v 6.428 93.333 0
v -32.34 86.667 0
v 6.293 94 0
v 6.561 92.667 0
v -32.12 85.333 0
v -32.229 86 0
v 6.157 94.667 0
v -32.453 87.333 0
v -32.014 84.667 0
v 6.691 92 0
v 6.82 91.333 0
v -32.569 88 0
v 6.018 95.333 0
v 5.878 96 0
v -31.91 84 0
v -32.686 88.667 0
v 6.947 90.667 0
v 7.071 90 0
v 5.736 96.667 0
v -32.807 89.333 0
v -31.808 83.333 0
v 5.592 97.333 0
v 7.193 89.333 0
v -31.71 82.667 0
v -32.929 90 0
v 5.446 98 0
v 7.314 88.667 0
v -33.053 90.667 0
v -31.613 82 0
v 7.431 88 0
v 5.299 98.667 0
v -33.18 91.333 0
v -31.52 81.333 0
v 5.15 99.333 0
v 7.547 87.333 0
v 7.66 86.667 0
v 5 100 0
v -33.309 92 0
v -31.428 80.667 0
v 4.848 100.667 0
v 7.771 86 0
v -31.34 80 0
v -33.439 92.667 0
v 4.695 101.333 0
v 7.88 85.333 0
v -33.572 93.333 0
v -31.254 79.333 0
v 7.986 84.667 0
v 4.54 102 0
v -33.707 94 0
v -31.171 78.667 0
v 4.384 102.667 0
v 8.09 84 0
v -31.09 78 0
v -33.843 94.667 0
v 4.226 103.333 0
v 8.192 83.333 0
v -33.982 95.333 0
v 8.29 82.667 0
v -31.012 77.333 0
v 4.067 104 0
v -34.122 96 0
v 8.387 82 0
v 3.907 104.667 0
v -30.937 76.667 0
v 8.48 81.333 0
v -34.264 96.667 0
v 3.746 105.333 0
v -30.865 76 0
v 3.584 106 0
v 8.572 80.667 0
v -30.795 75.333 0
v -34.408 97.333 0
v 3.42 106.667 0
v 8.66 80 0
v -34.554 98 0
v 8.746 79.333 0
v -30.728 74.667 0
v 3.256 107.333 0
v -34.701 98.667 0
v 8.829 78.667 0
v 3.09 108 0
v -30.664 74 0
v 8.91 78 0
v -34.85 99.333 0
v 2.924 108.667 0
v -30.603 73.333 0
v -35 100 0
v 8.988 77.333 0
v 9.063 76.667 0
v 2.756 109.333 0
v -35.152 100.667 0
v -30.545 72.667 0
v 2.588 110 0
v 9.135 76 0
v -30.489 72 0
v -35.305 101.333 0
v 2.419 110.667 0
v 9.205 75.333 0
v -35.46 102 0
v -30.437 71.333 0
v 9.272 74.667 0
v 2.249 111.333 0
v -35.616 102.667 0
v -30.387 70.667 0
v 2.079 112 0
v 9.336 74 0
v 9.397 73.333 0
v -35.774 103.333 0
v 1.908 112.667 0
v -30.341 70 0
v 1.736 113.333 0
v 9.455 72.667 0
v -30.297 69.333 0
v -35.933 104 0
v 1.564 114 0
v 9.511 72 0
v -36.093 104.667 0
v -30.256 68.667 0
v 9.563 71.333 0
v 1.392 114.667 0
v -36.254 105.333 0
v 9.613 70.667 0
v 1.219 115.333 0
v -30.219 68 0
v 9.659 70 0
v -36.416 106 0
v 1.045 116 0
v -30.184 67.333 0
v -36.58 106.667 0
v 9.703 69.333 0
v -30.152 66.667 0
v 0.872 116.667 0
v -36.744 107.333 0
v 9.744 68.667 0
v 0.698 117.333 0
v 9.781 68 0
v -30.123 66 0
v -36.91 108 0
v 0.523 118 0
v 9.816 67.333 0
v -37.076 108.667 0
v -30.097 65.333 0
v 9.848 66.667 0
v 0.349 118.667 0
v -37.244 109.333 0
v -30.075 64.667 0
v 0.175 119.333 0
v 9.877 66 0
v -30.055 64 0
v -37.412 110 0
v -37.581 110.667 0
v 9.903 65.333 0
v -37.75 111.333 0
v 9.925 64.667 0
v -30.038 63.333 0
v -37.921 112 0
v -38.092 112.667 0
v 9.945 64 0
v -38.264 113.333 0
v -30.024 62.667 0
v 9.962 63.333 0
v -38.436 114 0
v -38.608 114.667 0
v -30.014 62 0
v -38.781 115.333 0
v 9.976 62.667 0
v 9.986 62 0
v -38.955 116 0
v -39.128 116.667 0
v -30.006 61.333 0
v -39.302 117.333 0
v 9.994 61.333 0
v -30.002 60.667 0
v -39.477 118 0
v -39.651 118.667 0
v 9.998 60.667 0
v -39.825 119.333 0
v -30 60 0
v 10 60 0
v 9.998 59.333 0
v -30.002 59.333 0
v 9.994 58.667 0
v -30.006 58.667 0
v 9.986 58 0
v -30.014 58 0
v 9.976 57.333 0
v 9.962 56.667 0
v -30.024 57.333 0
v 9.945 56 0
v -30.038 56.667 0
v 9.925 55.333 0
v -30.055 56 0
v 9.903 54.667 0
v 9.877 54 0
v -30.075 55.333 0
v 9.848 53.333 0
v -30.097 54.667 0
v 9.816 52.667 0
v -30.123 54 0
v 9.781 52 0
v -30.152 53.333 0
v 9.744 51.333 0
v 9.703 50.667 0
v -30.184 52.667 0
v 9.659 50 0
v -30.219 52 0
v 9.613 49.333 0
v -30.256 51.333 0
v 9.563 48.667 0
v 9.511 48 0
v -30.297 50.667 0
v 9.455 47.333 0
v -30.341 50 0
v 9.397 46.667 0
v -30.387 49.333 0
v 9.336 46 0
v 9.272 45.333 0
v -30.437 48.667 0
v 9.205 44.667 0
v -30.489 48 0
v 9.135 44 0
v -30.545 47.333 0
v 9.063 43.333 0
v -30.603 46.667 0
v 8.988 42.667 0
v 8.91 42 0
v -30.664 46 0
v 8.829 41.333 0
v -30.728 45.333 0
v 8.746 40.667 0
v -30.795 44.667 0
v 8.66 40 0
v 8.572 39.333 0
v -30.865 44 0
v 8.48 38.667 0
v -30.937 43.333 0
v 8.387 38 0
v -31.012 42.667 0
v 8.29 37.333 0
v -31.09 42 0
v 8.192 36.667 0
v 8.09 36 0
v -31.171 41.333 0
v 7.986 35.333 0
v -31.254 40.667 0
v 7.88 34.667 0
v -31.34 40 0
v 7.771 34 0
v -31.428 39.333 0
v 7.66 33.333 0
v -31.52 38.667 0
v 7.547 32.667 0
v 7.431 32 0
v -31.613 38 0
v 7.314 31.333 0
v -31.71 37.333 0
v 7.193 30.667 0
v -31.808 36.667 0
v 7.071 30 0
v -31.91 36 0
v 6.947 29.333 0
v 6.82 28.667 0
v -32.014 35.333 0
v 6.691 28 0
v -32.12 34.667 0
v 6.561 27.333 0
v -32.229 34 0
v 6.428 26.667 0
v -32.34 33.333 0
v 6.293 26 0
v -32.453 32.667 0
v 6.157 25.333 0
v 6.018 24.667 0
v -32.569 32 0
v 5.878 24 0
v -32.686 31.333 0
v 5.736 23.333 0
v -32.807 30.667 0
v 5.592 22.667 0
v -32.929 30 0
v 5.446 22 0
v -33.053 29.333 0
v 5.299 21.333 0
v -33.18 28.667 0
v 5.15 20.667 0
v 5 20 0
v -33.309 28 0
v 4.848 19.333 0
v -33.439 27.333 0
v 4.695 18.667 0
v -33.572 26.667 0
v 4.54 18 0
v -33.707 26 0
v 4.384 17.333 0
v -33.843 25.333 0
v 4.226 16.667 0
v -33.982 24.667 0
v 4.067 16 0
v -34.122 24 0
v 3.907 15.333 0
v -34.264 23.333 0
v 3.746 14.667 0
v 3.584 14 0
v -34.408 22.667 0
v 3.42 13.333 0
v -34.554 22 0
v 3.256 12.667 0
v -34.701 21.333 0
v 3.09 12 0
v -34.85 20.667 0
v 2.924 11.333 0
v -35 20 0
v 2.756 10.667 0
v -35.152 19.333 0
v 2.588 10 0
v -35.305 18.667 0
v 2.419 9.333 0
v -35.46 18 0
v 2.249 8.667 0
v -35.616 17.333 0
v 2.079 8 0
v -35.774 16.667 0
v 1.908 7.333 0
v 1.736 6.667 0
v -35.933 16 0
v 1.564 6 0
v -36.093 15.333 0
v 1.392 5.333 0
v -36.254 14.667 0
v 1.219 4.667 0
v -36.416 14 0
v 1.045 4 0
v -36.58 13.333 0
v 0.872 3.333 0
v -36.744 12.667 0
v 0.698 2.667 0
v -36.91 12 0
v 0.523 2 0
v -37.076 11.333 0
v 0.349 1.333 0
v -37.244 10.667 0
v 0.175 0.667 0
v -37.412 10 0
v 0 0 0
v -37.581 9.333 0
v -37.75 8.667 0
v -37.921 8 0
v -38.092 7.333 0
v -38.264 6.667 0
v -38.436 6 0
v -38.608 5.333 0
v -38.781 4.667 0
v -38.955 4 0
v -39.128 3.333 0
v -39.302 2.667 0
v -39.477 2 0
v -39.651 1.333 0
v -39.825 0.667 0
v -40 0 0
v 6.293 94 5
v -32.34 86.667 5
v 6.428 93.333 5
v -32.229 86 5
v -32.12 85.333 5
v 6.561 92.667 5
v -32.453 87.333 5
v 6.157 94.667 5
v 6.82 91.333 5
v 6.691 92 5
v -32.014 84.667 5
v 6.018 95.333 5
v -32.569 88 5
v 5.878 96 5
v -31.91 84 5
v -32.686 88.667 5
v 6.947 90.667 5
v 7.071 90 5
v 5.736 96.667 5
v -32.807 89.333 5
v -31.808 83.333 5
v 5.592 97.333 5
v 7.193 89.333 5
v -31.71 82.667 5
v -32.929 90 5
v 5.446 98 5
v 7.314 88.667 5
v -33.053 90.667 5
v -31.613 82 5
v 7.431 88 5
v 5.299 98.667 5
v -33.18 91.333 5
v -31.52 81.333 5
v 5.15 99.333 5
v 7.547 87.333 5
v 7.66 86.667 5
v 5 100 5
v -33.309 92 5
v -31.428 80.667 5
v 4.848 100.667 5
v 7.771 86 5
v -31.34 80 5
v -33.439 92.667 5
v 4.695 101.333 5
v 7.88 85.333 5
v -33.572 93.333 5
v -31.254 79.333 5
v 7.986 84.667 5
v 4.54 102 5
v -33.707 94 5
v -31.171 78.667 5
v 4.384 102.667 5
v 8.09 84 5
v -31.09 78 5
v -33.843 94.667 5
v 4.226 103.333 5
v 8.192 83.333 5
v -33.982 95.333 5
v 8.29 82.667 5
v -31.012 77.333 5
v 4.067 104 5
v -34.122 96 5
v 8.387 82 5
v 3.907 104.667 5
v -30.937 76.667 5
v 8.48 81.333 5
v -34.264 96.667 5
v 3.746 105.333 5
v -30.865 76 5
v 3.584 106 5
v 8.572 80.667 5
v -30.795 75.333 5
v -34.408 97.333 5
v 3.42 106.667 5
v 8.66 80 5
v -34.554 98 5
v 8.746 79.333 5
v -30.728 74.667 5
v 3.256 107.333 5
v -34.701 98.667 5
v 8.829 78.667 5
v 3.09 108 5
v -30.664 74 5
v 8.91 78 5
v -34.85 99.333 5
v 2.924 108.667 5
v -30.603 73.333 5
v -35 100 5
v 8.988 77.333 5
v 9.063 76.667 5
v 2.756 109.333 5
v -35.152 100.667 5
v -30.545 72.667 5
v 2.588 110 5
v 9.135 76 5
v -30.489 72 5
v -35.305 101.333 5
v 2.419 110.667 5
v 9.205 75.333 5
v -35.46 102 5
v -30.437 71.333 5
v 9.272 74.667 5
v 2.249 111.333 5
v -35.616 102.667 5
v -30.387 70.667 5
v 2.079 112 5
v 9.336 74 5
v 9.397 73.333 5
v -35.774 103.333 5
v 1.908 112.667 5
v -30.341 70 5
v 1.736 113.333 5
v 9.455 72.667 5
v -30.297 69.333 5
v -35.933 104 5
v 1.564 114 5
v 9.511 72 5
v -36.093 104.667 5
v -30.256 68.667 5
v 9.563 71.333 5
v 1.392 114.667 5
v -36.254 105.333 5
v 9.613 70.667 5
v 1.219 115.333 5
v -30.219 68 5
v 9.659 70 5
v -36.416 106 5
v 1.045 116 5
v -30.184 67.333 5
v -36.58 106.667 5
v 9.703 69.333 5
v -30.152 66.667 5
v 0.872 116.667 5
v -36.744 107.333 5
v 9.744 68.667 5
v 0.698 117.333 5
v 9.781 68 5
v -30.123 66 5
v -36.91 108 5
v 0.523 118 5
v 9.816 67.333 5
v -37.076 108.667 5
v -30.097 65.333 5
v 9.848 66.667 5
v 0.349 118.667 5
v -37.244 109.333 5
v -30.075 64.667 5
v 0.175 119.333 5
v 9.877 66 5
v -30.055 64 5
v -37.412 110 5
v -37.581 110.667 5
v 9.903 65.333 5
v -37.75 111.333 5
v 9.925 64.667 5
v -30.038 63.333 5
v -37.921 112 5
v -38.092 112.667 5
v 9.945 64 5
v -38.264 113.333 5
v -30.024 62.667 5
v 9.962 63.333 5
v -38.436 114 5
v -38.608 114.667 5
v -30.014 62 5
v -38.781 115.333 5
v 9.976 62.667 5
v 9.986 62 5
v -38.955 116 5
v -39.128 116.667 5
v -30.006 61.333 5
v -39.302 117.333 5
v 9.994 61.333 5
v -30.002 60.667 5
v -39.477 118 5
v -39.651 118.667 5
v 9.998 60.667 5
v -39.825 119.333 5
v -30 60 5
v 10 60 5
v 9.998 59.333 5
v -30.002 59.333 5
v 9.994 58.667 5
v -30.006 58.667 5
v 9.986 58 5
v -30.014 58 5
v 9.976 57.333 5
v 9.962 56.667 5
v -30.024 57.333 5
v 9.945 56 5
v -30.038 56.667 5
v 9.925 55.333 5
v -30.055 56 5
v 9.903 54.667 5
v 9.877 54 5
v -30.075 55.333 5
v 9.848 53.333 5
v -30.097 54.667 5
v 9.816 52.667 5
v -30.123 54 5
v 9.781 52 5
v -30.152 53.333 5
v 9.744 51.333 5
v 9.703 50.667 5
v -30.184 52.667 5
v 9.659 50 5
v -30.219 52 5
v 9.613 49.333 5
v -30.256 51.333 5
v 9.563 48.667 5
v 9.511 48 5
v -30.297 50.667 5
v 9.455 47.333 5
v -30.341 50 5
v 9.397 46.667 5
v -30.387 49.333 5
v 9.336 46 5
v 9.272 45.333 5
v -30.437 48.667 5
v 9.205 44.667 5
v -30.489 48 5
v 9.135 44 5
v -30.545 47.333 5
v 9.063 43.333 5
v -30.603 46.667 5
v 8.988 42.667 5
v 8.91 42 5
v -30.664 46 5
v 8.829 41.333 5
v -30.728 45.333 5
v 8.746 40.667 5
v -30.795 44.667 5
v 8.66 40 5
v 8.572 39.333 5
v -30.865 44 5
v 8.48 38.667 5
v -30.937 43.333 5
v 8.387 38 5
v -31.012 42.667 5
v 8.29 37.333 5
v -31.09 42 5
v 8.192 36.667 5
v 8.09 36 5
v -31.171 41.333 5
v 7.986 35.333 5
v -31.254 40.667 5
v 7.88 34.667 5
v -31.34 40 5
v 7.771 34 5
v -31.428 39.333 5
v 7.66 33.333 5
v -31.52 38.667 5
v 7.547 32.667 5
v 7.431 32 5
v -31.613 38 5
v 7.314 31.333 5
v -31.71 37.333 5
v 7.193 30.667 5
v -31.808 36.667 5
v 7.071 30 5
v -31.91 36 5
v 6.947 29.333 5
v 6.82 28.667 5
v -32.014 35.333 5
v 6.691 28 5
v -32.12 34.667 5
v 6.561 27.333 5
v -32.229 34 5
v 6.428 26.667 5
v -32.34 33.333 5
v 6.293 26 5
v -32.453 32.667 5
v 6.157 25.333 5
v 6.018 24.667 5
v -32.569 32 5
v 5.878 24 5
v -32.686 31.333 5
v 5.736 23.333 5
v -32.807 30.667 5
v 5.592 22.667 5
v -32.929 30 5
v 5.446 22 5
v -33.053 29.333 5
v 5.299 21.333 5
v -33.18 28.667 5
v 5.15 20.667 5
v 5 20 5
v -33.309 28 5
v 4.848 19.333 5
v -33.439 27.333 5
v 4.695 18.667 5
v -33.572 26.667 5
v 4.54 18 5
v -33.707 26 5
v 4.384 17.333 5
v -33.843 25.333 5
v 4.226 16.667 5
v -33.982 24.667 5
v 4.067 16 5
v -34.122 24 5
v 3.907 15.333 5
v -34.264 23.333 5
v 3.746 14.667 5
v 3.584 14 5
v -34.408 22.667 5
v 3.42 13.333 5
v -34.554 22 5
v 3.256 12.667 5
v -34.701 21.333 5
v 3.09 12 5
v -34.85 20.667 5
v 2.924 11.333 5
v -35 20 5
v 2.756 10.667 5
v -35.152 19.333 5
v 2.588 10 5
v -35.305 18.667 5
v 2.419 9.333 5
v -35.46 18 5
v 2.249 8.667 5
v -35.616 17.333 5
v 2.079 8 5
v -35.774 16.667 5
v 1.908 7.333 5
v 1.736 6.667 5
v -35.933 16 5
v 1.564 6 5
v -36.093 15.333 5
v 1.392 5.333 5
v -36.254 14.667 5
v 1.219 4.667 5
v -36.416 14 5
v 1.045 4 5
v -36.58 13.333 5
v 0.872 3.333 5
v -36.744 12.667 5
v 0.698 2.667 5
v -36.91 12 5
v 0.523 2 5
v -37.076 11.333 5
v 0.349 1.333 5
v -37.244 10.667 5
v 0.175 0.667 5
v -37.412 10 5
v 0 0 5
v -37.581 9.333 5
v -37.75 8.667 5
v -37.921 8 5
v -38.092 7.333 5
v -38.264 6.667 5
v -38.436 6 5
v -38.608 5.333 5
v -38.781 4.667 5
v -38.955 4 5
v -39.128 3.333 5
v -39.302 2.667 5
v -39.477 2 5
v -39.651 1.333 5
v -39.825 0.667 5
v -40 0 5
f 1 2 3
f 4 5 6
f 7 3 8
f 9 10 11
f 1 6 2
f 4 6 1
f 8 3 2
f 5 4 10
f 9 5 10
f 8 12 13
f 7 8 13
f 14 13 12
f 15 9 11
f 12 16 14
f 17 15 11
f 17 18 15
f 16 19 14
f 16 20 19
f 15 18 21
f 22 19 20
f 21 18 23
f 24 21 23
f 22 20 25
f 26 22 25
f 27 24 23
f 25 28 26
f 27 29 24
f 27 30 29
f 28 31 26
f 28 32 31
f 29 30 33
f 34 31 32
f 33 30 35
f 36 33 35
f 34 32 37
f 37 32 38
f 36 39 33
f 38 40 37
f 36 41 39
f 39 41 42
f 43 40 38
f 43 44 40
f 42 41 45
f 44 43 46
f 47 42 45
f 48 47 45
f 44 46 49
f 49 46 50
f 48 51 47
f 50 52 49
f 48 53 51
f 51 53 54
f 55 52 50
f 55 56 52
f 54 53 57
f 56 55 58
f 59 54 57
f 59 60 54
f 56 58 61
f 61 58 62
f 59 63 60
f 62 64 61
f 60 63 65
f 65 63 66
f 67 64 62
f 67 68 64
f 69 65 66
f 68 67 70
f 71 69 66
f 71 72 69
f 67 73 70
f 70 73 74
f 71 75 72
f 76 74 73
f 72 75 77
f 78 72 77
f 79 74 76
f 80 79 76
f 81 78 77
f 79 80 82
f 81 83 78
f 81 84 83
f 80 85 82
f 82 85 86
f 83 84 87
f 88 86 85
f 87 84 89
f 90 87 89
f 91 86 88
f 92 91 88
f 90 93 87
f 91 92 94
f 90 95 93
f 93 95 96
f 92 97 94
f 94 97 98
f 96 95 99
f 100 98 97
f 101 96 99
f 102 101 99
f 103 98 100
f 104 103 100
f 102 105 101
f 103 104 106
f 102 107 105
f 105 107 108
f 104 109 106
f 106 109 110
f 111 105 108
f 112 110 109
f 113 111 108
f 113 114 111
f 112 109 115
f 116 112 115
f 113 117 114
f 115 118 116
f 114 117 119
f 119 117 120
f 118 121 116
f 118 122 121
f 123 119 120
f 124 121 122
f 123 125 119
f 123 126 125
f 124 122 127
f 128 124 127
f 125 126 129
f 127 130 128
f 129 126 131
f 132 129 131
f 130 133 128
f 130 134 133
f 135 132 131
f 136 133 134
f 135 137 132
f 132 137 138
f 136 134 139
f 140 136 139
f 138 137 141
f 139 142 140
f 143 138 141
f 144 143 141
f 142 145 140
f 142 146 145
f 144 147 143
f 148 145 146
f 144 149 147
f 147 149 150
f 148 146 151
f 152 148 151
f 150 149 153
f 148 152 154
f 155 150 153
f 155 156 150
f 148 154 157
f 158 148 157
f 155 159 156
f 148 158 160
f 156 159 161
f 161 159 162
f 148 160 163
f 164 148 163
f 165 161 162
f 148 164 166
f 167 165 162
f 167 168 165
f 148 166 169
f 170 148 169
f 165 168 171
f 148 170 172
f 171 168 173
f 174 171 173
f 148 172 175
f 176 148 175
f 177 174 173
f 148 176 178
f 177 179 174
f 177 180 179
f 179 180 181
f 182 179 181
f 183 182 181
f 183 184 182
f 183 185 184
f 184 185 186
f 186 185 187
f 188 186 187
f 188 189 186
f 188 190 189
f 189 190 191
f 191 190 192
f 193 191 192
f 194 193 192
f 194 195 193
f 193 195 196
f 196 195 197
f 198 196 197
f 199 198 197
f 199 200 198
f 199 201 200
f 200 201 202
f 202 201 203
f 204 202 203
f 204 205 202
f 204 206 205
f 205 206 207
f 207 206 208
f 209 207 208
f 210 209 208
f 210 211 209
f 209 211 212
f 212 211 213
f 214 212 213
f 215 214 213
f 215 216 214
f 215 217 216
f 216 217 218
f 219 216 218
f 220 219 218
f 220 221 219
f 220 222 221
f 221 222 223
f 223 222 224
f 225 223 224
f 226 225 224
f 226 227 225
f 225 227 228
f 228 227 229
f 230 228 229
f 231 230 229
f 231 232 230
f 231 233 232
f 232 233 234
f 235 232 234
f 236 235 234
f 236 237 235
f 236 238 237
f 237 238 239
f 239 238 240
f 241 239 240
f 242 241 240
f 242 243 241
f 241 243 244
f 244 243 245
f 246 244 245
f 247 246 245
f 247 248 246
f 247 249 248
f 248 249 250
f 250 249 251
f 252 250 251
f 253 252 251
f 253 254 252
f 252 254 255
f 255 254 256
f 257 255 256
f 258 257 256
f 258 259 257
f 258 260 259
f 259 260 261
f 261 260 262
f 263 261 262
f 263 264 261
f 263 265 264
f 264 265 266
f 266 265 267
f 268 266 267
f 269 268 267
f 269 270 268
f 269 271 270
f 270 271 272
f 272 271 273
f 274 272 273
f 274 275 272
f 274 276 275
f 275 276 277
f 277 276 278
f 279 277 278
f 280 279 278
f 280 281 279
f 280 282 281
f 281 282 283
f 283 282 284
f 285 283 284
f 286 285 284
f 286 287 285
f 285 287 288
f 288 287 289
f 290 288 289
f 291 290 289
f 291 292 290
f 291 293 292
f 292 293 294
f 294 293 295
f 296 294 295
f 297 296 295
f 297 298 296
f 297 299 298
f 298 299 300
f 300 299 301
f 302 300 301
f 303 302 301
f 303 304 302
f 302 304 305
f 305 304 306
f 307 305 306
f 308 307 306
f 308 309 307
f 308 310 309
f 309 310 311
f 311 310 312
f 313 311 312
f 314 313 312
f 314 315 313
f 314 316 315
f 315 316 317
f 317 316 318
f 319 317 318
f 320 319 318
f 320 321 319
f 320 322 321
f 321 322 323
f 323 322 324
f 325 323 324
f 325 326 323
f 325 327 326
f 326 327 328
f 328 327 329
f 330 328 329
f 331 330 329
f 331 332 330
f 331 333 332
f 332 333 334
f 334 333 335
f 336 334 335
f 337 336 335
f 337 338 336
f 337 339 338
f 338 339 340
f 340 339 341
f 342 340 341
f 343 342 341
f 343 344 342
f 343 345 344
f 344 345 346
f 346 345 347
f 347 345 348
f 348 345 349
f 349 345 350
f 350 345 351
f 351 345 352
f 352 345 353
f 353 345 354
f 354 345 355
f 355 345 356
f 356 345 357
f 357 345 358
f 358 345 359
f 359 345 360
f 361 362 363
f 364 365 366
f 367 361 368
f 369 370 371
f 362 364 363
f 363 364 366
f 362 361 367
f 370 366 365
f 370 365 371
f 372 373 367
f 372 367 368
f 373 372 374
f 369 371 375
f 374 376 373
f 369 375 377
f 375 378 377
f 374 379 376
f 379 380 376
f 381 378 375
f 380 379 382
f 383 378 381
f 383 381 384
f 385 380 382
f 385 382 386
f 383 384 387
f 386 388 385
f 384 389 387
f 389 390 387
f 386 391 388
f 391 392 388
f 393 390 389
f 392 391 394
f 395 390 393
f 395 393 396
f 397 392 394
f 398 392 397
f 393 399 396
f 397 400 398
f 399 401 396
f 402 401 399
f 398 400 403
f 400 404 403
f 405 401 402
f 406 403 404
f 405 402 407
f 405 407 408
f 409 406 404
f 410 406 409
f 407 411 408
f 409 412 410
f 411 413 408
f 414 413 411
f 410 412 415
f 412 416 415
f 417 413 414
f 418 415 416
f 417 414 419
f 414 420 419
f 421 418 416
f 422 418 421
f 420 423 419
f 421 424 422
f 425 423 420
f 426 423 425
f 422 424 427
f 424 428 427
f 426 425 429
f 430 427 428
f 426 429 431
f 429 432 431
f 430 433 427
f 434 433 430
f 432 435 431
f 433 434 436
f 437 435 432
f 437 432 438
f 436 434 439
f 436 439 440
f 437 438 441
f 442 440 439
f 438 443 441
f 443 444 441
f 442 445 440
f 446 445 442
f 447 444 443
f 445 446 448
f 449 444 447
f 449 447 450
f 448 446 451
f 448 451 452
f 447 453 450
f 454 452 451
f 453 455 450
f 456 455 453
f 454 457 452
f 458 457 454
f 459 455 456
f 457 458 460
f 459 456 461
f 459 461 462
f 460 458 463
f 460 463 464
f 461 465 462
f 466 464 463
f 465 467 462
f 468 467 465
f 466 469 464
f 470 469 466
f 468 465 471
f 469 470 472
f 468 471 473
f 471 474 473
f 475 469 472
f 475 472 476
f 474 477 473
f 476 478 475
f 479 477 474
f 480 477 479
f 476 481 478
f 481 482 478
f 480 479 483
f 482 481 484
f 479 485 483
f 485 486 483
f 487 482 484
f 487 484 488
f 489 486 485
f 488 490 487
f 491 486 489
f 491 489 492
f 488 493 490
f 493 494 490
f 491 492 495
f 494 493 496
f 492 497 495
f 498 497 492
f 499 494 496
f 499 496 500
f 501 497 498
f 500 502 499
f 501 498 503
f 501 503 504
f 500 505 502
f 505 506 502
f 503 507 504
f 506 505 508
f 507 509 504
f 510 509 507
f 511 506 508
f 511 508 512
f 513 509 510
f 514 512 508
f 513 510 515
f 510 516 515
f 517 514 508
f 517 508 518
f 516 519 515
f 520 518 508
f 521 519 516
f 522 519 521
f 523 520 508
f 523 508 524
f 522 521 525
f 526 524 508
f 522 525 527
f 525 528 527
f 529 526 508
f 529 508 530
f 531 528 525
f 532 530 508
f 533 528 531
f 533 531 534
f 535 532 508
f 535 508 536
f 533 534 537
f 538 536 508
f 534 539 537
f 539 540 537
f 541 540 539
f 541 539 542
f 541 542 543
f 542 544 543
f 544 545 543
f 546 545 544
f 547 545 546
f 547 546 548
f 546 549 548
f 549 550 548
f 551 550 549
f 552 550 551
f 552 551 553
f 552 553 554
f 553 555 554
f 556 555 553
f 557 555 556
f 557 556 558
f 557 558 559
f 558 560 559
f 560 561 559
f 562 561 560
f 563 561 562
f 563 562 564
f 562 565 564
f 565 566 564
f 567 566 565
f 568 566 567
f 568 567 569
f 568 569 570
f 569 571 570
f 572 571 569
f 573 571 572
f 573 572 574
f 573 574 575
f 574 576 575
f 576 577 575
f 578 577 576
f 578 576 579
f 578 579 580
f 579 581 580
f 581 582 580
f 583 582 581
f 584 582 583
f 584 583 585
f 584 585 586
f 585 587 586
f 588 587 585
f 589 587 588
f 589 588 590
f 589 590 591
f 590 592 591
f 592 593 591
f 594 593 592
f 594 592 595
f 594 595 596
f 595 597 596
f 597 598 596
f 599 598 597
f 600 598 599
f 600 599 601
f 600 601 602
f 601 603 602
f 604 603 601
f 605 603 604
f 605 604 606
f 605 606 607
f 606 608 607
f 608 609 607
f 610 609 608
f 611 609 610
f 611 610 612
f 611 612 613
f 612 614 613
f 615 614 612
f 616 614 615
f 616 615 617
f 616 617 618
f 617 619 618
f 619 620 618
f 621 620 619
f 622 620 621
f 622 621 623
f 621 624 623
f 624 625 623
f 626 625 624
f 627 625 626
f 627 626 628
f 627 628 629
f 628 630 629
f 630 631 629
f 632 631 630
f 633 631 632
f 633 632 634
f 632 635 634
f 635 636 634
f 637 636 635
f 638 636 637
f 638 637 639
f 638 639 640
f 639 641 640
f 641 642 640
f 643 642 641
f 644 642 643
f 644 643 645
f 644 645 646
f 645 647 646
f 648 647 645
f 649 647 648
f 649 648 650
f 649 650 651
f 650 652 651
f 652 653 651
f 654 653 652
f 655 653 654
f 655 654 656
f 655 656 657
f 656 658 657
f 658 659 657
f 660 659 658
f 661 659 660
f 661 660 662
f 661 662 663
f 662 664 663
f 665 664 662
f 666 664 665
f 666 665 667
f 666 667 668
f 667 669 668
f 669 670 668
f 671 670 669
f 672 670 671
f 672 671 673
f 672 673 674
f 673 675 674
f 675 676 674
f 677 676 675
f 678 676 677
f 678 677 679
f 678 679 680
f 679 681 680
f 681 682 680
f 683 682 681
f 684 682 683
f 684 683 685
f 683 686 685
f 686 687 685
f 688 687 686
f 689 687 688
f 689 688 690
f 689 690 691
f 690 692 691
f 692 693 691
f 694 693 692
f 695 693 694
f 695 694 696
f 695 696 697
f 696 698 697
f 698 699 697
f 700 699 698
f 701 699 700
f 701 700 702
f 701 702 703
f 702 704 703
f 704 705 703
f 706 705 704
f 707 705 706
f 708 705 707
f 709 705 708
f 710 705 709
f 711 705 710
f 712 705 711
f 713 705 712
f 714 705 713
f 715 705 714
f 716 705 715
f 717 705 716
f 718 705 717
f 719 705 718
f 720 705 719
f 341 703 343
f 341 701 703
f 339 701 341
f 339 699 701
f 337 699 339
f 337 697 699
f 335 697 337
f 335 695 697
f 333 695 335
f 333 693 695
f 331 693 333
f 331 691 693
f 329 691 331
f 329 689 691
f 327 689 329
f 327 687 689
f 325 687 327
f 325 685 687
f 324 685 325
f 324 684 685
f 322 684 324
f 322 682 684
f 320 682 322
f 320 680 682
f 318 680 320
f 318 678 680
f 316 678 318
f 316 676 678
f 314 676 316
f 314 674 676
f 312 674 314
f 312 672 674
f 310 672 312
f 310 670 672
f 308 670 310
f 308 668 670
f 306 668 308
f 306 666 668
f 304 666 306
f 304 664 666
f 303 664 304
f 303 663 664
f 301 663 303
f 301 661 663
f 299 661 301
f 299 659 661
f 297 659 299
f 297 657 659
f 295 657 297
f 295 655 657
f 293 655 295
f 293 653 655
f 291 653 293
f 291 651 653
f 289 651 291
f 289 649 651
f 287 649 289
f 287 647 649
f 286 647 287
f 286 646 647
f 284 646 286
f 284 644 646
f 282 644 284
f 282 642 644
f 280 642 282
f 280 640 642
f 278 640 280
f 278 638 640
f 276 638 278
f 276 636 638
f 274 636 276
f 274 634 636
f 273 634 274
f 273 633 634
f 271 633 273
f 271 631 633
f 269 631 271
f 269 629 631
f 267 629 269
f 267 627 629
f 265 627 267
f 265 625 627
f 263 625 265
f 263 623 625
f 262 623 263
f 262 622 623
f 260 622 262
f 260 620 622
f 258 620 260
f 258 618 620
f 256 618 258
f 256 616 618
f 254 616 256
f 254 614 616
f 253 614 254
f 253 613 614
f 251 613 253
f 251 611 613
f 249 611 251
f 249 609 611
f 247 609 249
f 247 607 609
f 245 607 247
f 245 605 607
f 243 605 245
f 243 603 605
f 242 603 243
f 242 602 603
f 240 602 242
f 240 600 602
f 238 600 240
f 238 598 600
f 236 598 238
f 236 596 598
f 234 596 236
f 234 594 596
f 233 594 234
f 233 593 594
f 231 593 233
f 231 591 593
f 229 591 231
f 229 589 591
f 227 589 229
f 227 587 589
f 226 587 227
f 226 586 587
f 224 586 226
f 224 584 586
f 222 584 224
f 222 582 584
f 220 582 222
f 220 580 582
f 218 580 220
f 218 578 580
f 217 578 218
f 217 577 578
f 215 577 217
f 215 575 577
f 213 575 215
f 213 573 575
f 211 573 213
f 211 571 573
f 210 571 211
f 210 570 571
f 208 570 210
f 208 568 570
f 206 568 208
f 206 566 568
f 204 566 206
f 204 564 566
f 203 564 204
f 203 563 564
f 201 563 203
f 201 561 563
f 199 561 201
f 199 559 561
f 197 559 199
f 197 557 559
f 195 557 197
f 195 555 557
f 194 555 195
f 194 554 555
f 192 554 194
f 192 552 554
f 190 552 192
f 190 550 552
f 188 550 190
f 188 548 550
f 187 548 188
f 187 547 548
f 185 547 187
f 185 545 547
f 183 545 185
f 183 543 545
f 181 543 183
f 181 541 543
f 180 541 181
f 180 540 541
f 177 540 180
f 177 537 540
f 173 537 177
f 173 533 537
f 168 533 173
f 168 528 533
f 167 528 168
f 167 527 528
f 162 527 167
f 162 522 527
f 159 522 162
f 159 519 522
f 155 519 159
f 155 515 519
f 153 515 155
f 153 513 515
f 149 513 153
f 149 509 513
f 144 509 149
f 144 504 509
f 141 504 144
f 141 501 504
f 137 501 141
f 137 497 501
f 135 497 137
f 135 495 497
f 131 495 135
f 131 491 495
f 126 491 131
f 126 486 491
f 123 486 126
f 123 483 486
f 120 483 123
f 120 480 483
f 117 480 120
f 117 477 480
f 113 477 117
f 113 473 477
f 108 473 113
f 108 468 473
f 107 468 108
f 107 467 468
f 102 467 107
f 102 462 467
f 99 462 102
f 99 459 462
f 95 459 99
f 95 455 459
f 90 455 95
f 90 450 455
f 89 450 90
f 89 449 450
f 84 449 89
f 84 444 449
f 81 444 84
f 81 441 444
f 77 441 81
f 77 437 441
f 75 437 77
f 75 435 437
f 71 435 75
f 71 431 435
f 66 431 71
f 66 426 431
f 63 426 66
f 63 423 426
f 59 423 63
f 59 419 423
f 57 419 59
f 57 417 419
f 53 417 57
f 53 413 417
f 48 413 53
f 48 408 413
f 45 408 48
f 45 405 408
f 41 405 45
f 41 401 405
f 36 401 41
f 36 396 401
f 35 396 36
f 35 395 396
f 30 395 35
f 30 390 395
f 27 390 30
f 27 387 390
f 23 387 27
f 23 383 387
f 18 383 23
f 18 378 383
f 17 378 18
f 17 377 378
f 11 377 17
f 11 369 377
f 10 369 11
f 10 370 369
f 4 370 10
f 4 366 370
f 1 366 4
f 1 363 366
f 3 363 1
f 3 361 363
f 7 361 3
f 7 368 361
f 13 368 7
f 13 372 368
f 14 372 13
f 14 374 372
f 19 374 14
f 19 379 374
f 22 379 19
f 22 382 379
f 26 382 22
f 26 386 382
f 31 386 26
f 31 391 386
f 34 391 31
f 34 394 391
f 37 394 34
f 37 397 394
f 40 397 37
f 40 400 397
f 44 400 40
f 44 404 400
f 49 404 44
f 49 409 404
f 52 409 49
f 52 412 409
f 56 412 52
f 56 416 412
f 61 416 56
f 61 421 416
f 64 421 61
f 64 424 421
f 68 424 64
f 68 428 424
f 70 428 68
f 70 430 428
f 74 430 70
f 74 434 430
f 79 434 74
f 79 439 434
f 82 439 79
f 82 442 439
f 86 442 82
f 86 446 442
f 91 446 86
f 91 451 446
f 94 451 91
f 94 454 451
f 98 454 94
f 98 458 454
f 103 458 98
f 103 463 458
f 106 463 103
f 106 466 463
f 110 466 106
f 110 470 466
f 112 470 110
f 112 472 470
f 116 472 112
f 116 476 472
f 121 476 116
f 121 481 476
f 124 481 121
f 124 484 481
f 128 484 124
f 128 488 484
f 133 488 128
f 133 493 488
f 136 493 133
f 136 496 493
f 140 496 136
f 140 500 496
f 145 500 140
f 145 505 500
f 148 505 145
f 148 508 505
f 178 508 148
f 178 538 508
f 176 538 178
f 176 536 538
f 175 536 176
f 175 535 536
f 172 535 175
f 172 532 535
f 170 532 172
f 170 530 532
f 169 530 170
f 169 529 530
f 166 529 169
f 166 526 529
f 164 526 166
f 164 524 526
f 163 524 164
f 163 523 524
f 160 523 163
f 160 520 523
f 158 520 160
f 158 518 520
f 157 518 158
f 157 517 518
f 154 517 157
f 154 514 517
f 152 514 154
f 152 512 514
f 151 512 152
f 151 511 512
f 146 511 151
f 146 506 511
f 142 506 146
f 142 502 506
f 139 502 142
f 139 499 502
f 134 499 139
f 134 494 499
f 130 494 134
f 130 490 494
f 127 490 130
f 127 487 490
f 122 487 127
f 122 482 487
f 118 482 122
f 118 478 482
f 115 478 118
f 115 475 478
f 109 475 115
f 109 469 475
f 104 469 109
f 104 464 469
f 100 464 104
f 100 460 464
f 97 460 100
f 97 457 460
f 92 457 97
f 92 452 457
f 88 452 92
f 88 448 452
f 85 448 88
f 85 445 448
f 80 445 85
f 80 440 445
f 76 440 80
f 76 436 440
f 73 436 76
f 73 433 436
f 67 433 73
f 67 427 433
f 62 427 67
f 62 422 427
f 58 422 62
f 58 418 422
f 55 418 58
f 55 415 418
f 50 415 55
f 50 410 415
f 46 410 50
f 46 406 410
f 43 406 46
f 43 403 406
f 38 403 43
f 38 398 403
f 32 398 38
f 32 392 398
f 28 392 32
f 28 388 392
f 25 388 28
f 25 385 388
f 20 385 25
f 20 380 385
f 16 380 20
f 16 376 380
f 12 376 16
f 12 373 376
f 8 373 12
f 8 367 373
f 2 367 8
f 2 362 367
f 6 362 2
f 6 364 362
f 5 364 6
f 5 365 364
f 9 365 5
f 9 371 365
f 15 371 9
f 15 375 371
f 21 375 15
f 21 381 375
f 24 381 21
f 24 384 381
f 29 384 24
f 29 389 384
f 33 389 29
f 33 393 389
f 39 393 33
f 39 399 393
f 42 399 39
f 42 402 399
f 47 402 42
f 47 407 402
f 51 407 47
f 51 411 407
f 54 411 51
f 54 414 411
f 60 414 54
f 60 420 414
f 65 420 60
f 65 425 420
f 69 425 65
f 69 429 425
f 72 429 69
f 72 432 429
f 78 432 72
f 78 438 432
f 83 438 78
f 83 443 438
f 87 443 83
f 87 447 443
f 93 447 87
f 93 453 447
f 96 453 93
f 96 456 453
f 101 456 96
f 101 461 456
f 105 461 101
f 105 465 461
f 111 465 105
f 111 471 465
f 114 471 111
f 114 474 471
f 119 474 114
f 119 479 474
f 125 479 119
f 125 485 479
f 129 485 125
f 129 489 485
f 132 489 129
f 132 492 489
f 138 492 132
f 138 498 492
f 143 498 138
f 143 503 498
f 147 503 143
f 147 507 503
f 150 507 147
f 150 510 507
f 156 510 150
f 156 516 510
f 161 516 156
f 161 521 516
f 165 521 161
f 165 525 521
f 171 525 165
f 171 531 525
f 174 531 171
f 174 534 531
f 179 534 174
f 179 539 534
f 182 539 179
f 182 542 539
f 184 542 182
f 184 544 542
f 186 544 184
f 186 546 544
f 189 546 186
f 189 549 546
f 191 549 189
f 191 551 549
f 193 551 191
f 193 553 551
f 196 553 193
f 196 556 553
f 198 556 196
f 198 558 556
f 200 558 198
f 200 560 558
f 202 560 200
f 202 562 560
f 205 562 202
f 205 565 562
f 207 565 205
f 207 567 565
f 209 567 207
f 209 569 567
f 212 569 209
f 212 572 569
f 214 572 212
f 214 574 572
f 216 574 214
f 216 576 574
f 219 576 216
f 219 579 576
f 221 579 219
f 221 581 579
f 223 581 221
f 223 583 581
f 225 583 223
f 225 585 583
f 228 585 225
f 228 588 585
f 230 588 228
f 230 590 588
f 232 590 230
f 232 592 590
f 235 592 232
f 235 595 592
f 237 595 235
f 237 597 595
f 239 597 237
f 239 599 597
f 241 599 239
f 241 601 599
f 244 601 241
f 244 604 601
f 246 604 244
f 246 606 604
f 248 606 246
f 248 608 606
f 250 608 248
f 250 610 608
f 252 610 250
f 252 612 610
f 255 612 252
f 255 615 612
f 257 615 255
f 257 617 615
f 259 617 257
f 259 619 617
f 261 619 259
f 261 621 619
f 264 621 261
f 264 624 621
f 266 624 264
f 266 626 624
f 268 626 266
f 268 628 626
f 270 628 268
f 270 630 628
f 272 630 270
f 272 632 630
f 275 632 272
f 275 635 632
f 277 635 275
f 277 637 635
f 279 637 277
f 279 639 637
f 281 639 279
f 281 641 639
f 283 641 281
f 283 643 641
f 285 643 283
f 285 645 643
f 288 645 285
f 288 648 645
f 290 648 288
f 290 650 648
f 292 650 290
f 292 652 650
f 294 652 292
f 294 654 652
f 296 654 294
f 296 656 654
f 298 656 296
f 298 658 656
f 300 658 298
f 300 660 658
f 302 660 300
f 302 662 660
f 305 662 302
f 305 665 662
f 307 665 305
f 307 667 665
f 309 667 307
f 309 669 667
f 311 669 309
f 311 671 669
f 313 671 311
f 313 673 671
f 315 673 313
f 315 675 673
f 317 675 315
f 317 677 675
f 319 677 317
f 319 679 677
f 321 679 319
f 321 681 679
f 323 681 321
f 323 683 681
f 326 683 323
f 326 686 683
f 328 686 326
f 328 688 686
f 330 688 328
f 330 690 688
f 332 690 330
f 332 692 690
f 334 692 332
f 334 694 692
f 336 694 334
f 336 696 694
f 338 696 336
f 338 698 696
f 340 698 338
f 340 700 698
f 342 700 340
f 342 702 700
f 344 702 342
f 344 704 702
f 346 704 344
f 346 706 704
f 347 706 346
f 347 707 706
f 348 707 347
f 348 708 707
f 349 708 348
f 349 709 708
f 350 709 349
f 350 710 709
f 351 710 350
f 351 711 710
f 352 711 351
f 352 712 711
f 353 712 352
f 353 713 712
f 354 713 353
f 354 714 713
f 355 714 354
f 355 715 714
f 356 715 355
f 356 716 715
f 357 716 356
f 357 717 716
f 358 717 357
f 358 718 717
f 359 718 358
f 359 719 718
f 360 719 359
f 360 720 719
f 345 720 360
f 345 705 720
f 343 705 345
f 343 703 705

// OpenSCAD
module femurbase(){
translate([0,0,0])
linear_extrude(height=5)
polygon([[0.0, 0.0], [0.17452406437283513, 0.6666666666666666], [0.3489949670250097, 1.3333333333333333], [0.5233595624294383, 2.0], [0.697564737441253, 2.6666666666666665], [0.8715574274765816, 3.333333333333333], [1.0452846326765346, 4.0], [1.2186934340514748, 4.666666666666666], [1.3917310096006543, 5.333333333333333], [1.5643446504023086, 6.0], [1.7364817766693033, 6.666666666666666], [1.908089953765448, 7.333333333333333], [2.079116908177593, 8.0], [2.2495105434386495, 8.666666666666666], [2.4192189559966772, 9.333333333333332], [2.5881904510252074, 10.0], [2.7563735581699915, 10.666666666666666], [2.9237170472273672, 11.333333333333332], [3.090169943749474, 12.0], [3.255681544571567, 12.666666666666666], [3.420201433256687, 13.333333333333332], [3.5836794954530027, 14.0], [3.74606593415912, 14.666666666666666], [3.907311284892737, 15.333333333333332], [4.0673664307580015, 16.0], [4.2261826174069945, 16.666666666666664], [4.383711467890774, 17.333333333333332], [4.5399049973954675, 18.0], [4.694715627858908, 18.666666666666664], [4.8480962024633705, 19.333333333333332], [4.999999999999999, 20.0], [5.150380749100542, 20.666666666666664], [5.299192642332049, 21.333333333333332], [5.44639035015027, 22.0], [5.5919290347074675, 22.666666666666664], [5.7357643635104605, 23.333333333333332], [5.877852522924732, 24.0], [6.018150231520483, 24.666666666666664], [6.156614753256583, 25.333333333333332], [6.2932039104983755, 26.0], [6.4278760968653925, 26.666666666666664], [6.560590289905073, 27.333333333333332], [6.691306063588582, 28.0], [6.819983600624985, 28.666666666666664], [6.9465837045899725, 29.333333333333332], [7.071067811865475, 30.0], [7.193398003386511, 30.666666666666664], [7.313537016191704, 31.333333333333332], [7.431448254773941, 32.0], [7.5470958022277195, 32.666666666666664], [7.66044443118978, 33.33333333333333], [7.771459614569708, 34.0], [7.880107536067219, 34.666666666666664], [7.986355100472928, 35.33333333333333], [8.090169943749475, 36.0], [8.191520442889917, 36.666666666666664], [8.290375725550417, 37.33333333333333], [8.38670567945424, 38.0], [8.48048096156426, 38.666666666666664], [8.571673007021122, 39.33333333333333], [8.660254037844386, 40.0], [8.746197071393958, 40.666666666666664], [8.829475928589268, 41.33333333333333], [8.910065241883679, 42.0], [8.98794046299167, 42.666666666666664], [9.063077870366499, 43.33333333333333], [9.135454576426008, 44.0], [9.205048534524403, 44.666666666666664], [9.271838545667872, 45.33333333333333], [9.335804264972017, 46.0], [9.396926207859083, 46.666666666666664], [9.455185755993167, 47.33333333333333], [9.510565162951535, 48.0], [9.563047559630354, 48.666666666666664], [9.612616959383189, 49.33333333333333], [9.659258262890683, 50.0], [9.702957262759965, 50.666666666666664], [9.743700647852352, 51.33333333333333], [9.781476007338057, 52.0], [9.81627183447664, 52.666666666666664], [9.84807753012208, 53.33333333333333], [9.876883405951379, 54.0], [9.902680687415703, 54.666666666666664], [9.92546151641322, 55.33333333333333], [9.945218953682733, 56.0], [9.961946980917455, 56.666666666666664], [9.975640502598242, 57.33333333333333], [9.986295347545738, 58.0], [9.993908270190957, 58.666666666666664], [9.998476951563912, 59.33333333333333], [10.0, 60.0], [9.998476951563912, 60.666666666666664], [9.993908270190957, 61.33333333333333], [9.986295347545738, 62.0], [9.975640502598242, 62.666666666666664], [9.961946980917455, 63.33333333333333], [9.945218953682733, 64.0], [9.925461516413222, 64.66666666666666], [9.902680687415703, 65.33333333333333], [9.876883405951377, 66.0], [9.84807753012208, 66.66666666666666], [9.81627183447664, 67.33333333333333], [9.781476007338057, 68.0], [9.743700647852352, 68.66666666666666], [9.702957262759965, 69.33333333333333], [9.659258262890683, 70.0], [9.612616959383189, 70.66666666666666], [9.563047559630355, 71.33333333333333], [9.510565162951536, 72.0], [9.455185755993169, 72.66666666666666], [9.396926207859085, 73.33333333333333], [9.335804264972017, 74.0], [9.271838545667874, 74.66666666666666], [9.205048534524403, 75.33333333333333], [9.13545457642601, 76.0], [9.0630778703665, 76.66666666666666], [8.98794046299167, 77.33333333333333], [8.910065241883679, 78.0], [8.829475928589272, 78.66666666666666], [8.746197071393958, 79.33333333333333], [8.660254037844387, 80.0], [8.571673007021124, 80.66666666666666], [8.480480961564261, 81.33333333333333], [8.38670567945424, 82.0], [8.290375725550417, 82.66666666666666], [8.19152044288992, 83.33333333333333], [8.090169943749475, 84.0], [7.986355100472927, 84.66666666666666], [7.88010753606722, 85.33333333333333], [7.77145961456971, 86.0], [7.66044443118978, 86.66666666666666], [7.547095802227721, 87.33333333333333], [7.431448254773945, 88.0], [7.313537016191706, 88.66666666666666], [7.193398003386511, 89.33333333333333], [7.0710678118654755, 90.0], [6.946583704589974, 90.66666666666666], [6.819983600624986, 91.33333333333333], [6.691306063588581, 92.0], [6.560590289905073, 92.66666666666666], [6.427876096865395, 93.33333333333333], [6.293203910498374, 94.0], [6.156614753256584, 94.66666666666666], [6.018150231520486, 95.33333333333333], [5.877852522924733, 96.0], [5.73576436351046, 96.66666666666666], [5.591929034707469, 97.33333333333333], [5.446390350150273, 98.0], [5.299192642332049, 98.66666666666666], [5.1503807491005436, 99.33333333333333], [4.999999999999999, 100.0], [4.848096202463371, 100.66666666666666], [4.694715627858907, 101.33333333333333], [4.539904997395468, 102.0], [4.383711467890777, 102.66666666666666], [4.2261826174069945, 103.33333333333333], [4.067366430758001, 104.0], [3.907311284892738, 104.66666666666666], [3.7460659341591223, 105.33333333333333], [3.5836794954530067, 106.0], [3.420201433256689, 106.66666666666666], [3.2556815445715657, 107.33333333333333], [3.090169943749475, 108.0], [2.9237170472273704, 108.66666666666666], [2.756373558169992, 109.33333333333333], [2.58819045102521, 110.0], [2.4192189559966772, 110.66666666666666], [2.249510543438652, 111.33333333333333], [2.079116908177593, 112.0], [1.9080899537654497, 112.66666666666666], [1.736481776669307, 113.33333333333333], [1.5643446504023097, 114.0], [1.3917310096006532, 114.66666666666666], [1.2186934340514755, 115.33333333333333], [1.0452846326765373, 116.0], [0.8715574274765819, 116.66666666666666], [0.6975647374412552, 117.33333333333333], [0.5233595624294425, 118.0], [0.3489949670250114, 118.66666666666666], [0.17452406437283438, 119.33333333333333], [-39.82547593562717, 119.33333333333333], [-39.651005032974986, 118.66666666666666], [-39.47664043757056, 118.0], [-39.302435262558745, 117.33333333333333], [-39.12844257252342, 116.66666666666666], [-38.954715367323466, 116.0], [-38.781306565948526, 115.33333333333333], [-38.608268990399345, 114.66666666666666], [-38.43565534959769, 114.0], [-38.26351822333069, 113.33333333333333], [-38.09191004623455, 112.66666666666666], [-37.920883091822404, 112.0], [-37.75048945656135, 111.33333333333333], [-37.580781044003324, 110.66666666666666], [-37.41180954897479, 110.0], [-37.24362644183001, 109.33333333333333], [-37.07628295277263, 108.66666666666666], [-36.90983005625053, 108.0], [-36.744318455428434, 107.33333333333333], [-36.579798566743314, 106.66666666666666], [-36.416320504546995, 106.0], [-36.25393406584088, 105.33333333333333], [-36.092688715107265, 104.66666666666666], [-35.932633569242, 104.0], [-35.77381738259301, 103.33333333333333], [-35.61628853210922, 102.66666666666666], [-35.46009500260453, 102.0], [-35.305284372141095, 101.33333333333333], [-35.151903797536626, 100.66666666666666], [-35.0, 100.0], [-34.84961925089946, 99.33333333333333], [-34.700807357667955, 98.66666666666666], [-34.553609649849726, 98.0], [-34.40807096529253, 97.33333333333333], [-34.26423563648954, 96.66666666666666], [-34.122147477075266, 96.0], [-33.98184976847951, 95.33333333333333], [-33.843385246743416, 94.66666666666666], [-33.70679608950162, 94.0], [-33.5721239031346, 93.33333333333333], [-33.43940971009493, 92.66666666666666], [-33.308693936411416, 92.0], [-33.18001639937501, 91.33333333333333], [-33.053416295410024, 90.66666666666666], [-32.928932188134524, 90.0], [-32.80660199661349, 89.33333333333333], [-32.6864629838083, 88.66666666666666], [-32.56855174522605, 88.0], [-32.45290419777228, 87.33333333333333], [-32.33955556881022, 86.66666666666666], [-32.22854038543029, 86.0], [-32.11989246393278, 85.33333333333333], [-32.01364489952707, 84.66666666666666], [-31.909830056250527, 84.0], [-31.80847955711008, 83.33333333333333], [-31.70962427444958, 82.66666666666666], [-31.613294320545762, 82.0], [-31.51951903843574, 81.33333333333333], [-31.428326992978874, 80.66666666666666], [-31.33974596215561, 80.0], [-31.253802928606042, 79.33333333333333], [-31.17052407141073, 78.66666666666666], [-31.08993475811632, 78.0], [-31.01205953700833, 77.33333333333333], [-30.9369221296335, 76.66666666666666], [-30.86454542357399, 76.0], [-30.7949514654756, 75.33333333333333], [-30.728161454332124, 74.66666666666666], [-30.66419573502798, 74.0], [-30.603073792140915, 73.33333333333333], [-30.54481424400683, 72.66666666666666], [-30.489434837048464, 72.0], [-30.436952440369645, 71.33333333333333], [-30.38738304061681, 70.66666666666666], [-30.34074173710932, 70.0], [-30.297042737240034, 69.33333333333333], [-30.25629935214765, 68.66666666666666], [-30.218523992661943, 68.0], [-30.183728165523362, 67.33333333333333], [-30.15192246987792, 66.66666666666666], [-30.123116594048625, 66.0], [-30.097319312584297, 65.33333333333333], [-30.074538483586778, 64.66666666666666], [-30.054781046317267, 64.0], [-30.038053019082547, 63.33333333333333], [-30.024359497401758, 62.666666666666664], [-30.013704652454262, 62.0], [-30.006091729809043, 61.33333333333333], [-30.001523048436088, 60.666666666666664], [-30.0, 60.0], [-30.001523048436088, 59.33333333333333], [-30.006091729809043, 58.666666666666664], [-30.013704652454262, 58.0], [-30.024359497401758, 57.33333333333333], [-30.038053019082547, 56.666666666666664], [-30.054781046317267, 56.0], [-30.074538483586778, 55.33333333333333], [-30.097319312584297, 54.666666666666664], [-30.12311659404862, 54.0], [-30.15192246987792, 53.33333333333333], [-30.183728165523362, 52.666666666666664], [-30.218523992661943, 52.0], [-30.25629935214765, 51.33333333333333], [-30.297042737240034, 50.666666666666664], [-30.34074173710932, 50.0], [-30.38738304061681, 49.33333333333333], [-30.436952440369645, 48.666666666666664], [-30.489434837048464, 48.0], [-30.544814244006833, 47.33333333333333], [-30.60307379214092, 46.666666666666664], [-30.66419573502798, 46.0], [-30.728161454332128, 45.33333333333333], [-30.7949514654756, 44.666666666666664], [-30.864545423573993, 44.0], [-30.9369221296335, 43.33333333333333], [-31.01205953700833, 42.666666666666664], [-31.08993475811632, 42.0], [-31.170524071410732, 41.33333333333333], [-31.253802928606042, 40.666666666666664], [-31.339745962155614, 40.0], [-31.428326992978878, 39.33333333333333], [-31.51951903843574, 38.666666666666664], [-31.613294320545762, 38.0], [-31.70962427444958, 37.33333333333333], [-31.808479557110083, 36.666666666666664], [-31.909830056250527, 36.0], [-32.01364489952707, 35.33333333333333], [-32.11989246393278, 34.666666666666664], [-32.22854038543029, 34.0], [-32.33955556881022, 33.33333333333333], [-32.452904197772284, 32.666666666666664], [-32.56855174522606, 32.0], [-32.6864629838083, 31.333333333333332], [-32.80660199661349, 30.666666666666664], [-32.928932188134524, 30.0], [-33.05341629541003, 29.333333333333332], [-33.18001639937501, 28.666666666666664], [-33.308693936411416, 28.0], [-33.43940971009493, 27.333333333333332], [-33.57212390313461, 26.666666666666664], [-33.70679608950162, 26.0], [-33.843385246743416, 25.333333333333332], [-33.98184976847952, 24.666666666666664], [-34.122147477075266, 24.0], [-34.26423563648954, 23.333333333333332], [-34.40807096529253, 22.666666666666664], [-34.55360964984973, 22.0], [-34.700807357667955, 21.333333333333332], [-34.84961925089946, 20.666666666666664], [-35.0, 20.0], [-35.15190379753663, 19.333333333333332], [-35.30528437214109, 18.666666666666664], [-35.46009500260453, 18.0], [-35.61628853210922, 17.333333333333332], [-35.77381738259301, 16.666666666666664], [-35.932633569242, 16.0], [-36.092688715107265, 15.333333333333332], [-36.25393406584088, 14.666666666666666], [-36.416320504546995, 14.0], [-36.579798566743314, 13.333333333333332], [-36.744318455428434, 12.666666666666666], [-36.90983005625053, 12.0], [-37.07628295277263, 11.333333333333332], [-37.24362644183001, 10.666666666666666], [-37.411809548974794, 10.0], [-37.580781044003324, 9.333333333333332], [-37.750489456561354, 8.666666666666666], [-37.920883091822404, 8.0], [-38.09191004623455, 7.333333333333333], [-38.2635182233307, 6.666666666666666], [-38.43565534959769, 6.0], [-38.608268990399345, 5.333333333333333], [-38.781306565948526, 4.666666666666666], [-38.954715367323466, 4.0], [-39.12844257252342, 3.333333333333333], [-39.302435262558745, 2.6666666666666665], [-39.47664043757056, 2.0], [-39.65100503297499, 1.3333333333333333], [-39.82547593562717, 0.6666666666666666], [-40.0, 0.0]]);
}
femurbase();
